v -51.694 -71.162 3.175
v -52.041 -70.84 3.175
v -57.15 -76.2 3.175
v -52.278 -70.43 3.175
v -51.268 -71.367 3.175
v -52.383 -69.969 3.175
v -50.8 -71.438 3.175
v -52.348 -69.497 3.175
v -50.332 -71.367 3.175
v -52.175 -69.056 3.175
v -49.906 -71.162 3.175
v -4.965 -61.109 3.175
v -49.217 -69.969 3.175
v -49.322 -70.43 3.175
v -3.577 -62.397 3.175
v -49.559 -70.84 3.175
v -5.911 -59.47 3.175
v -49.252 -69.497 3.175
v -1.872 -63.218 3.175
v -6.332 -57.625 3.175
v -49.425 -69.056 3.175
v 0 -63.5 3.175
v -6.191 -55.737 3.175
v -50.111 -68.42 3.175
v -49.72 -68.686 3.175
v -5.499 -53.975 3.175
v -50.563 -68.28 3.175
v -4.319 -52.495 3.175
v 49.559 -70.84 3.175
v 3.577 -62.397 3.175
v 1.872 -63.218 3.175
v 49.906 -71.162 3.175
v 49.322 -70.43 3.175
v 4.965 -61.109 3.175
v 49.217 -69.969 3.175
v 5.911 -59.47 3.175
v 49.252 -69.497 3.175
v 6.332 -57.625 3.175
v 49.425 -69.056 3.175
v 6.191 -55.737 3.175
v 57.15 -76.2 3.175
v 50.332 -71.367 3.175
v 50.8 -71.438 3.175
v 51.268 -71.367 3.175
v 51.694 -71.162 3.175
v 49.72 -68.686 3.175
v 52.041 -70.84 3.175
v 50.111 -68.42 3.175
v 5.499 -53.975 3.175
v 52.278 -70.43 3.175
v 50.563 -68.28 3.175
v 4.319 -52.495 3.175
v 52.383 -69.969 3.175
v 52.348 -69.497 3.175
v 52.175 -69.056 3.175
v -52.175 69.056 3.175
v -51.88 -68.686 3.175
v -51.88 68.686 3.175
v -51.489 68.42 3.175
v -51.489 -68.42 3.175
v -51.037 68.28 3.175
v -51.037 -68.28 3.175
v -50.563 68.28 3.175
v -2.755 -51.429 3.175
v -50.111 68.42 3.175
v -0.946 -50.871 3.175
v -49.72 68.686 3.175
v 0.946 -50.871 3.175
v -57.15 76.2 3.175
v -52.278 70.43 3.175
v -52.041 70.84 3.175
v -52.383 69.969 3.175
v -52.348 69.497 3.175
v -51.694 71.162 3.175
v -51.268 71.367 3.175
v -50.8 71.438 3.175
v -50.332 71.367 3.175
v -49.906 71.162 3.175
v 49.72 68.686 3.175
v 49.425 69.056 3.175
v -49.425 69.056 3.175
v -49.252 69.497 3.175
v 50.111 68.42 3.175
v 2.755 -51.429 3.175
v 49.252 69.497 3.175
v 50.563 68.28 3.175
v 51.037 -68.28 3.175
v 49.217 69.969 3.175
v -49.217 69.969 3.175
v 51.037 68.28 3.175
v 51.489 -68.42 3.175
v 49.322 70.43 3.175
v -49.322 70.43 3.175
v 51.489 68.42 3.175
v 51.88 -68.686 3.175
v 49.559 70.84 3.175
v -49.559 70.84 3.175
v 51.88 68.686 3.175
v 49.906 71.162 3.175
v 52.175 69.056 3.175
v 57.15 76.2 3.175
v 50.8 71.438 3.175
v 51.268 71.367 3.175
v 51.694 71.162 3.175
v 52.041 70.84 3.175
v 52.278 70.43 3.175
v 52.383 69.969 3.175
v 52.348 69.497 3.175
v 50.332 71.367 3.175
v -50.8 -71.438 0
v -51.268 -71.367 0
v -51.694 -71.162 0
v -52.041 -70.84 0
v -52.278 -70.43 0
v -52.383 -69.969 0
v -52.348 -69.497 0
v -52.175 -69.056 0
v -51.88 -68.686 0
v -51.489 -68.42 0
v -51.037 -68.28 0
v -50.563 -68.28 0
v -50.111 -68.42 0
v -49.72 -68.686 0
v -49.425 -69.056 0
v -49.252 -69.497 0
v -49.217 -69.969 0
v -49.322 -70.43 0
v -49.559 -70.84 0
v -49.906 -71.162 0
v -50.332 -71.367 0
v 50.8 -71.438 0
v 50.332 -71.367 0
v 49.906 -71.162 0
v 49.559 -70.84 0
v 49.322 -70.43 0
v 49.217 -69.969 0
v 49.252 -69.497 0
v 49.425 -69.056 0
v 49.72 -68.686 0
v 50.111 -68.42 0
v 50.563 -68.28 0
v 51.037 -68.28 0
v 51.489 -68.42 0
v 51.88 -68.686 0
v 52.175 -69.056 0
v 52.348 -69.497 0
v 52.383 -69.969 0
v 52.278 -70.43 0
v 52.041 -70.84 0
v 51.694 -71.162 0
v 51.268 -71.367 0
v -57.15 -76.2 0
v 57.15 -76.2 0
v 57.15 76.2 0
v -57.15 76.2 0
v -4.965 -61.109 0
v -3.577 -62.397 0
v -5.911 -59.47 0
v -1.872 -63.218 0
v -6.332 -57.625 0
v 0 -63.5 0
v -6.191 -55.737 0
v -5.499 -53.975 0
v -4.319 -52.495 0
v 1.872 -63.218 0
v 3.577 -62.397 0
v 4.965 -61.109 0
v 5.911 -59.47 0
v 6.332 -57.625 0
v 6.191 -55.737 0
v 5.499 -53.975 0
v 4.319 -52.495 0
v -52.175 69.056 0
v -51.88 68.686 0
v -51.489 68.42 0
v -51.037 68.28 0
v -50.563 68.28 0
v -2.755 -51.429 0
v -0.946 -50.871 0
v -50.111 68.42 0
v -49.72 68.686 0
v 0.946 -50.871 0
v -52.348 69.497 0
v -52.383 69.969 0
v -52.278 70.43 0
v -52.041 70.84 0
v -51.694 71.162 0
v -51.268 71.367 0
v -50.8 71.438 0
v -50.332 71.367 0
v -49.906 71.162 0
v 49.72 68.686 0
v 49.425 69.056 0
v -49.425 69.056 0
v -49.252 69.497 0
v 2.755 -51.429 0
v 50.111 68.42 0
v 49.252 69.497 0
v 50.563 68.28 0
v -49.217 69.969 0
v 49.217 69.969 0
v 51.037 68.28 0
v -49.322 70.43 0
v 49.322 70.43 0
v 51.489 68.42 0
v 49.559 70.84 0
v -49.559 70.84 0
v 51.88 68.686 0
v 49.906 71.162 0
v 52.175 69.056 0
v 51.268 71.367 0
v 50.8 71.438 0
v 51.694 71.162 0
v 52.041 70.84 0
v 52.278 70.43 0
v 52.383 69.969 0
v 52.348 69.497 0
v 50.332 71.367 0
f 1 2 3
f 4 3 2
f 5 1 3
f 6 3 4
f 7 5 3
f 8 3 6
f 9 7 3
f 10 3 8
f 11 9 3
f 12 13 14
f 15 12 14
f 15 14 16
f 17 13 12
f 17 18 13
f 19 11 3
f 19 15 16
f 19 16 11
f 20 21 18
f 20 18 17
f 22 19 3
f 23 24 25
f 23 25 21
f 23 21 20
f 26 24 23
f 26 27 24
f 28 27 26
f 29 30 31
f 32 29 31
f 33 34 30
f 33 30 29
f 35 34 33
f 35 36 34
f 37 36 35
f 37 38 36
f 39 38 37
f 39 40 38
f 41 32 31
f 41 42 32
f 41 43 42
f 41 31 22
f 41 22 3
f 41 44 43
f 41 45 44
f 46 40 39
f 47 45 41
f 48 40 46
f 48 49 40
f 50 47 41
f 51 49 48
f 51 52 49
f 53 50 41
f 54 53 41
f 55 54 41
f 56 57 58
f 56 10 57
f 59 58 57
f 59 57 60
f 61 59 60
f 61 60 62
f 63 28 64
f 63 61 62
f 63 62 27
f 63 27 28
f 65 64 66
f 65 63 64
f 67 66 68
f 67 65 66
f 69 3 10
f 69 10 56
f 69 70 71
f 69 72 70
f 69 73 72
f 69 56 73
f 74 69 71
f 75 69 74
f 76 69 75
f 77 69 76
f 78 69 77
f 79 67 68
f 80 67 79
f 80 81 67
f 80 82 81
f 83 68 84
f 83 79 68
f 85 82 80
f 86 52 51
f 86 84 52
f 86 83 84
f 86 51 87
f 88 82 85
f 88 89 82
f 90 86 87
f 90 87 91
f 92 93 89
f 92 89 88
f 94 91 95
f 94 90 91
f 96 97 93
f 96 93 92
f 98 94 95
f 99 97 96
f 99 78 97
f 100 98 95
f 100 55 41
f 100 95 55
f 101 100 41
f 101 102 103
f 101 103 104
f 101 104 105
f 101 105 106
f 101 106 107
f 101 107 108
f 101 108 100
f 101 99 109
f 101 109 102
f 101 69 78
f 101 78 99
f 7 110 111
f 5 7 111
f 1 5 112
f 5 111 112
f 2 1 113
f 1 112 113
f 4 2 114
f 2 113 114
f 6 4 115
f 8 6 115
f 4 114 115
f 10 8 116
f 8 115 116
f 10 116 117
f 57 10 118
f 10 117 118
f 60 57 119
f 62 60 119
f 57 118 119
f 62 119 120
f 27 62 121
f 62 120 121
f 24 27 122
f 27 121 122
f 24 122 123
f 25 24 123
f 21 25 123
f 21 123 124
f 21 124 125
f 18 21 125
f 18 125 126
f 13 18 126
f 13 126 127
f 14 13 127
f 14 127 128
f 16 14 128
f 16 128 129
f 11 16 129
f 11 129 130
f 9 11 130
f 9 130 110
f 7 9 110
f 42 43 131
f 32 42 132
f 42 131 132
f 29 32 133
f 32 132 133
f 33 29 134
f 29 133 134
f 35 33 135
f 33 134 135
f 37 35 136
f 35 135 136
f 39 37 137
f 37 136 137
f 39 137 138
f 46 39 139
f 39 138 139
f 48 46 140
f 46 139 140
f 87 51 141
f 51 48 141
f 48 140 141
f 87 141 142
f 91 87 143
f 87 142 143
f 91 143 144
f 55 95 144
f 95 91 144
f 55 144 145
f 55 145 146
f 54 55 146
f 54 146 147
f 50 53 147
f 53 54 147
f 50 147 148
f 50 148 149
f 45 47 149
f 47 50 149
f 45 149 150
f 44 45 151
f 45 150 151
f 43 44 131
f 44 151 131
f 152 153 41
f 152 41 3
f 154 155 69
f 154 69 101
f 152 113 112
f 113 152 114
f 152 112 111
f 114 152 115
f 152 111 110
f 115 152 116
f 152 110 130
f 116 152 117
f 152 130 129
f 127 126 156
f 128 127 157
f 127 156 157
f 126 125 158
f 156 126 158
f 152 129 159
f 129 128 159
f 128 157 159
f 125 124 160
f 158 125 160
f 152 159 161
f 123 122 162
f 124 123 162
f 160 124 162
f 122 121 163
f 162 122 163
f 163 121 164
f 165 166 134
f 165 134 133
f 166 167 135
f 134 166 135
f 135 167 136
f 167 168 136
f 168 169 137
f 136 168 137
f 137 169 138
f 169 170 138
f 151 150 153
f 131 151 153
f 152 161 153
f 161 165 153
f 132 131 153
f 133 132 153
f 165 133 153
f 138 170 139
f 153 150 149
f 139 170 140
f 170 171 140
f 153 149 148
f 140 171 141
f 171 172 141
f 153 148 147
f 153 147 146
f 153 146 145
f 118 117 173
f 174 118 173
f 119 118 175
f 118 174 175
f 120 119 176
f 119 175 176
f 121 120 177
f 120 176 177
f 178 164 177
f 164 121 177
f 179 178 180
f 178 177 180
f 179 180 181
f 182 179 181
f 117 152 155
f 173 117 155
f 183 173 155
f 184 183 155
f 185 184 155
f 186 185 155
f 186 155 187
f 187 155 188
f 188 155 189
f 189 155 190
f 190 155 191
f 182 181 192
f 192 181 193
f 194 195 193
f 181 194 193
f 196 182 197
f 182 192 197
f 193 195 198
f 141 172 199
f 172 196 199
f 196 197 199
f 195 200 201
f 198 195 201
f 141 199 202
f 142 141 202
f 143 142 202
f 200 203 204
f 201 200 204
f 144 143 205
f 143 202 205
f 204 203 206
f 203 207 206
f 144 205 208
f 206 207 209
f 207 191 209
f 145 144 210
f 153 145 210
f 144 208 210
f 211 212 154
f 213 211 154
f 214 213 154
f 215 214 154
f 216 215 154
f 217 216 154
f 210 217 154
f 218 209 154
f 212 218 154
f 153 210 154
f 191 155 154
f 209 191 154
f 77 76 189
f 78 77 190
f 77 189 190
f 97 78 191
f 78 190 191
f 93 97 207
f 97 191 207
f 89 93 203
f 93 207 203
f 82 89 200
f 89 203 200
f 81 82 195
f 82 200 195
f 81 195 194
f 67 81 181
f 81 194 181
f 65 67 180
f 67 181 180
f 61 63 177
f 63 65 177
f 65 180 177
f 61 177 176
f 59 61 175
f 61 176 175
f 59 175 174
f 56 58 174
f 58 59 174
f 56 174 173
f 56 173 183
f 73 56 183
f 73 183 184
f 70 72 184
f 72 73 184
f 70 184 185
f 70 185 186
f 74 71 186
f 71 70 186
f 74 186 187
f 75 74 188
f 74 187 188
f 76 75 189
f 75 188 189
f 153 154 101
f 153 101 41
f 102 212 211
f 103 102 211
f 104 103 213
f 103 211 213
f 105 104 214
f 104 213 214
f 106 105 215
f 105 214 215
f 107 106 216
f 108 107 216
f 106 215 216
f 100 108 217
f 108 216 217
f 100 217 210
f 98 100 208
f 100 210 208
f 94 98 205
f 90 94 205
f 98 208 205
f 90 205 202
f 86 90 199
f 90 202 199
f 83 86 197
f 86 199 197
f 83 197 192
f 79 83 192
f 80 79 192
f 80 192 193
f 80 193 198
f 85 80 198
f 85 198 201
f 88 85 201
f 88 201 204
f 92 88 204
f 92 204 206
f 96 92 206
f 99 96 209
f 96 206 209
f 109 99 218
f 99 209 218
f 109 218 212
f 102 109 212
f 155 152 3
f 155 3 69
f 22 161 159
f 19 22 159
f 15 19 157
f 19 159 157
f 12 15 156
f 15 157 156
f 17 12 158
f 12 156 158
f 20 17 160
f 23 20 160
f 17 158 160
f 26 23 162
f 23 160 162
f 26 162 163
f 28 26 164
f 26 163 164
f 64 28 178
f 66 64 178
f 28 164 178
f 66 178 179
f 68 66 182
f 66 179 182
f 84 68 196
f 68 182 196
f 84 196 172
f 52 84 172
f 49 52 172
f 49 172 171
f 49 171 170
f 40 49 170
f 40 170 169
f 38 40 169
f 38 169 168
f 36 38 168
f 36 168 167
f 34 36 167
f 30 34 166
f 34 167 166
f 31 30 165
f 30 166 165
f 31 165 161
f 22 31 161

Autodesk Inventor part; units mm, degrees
ref_plane "YZ Plane" through (0, 0, 0) normal (1, 0, 0) x (0, 1, 0)
ref_plane "XZ Plane" through (0, 0, 0) normal (0, 1, 0) x (-1, 0, 0)
ref_plane "XY Plane" through (0, 0, 0) normal (0, 0, 1) x (1, 0, 0)
sketch "Sketch1" plane through (0, 0, 0) normal (0, 0, 1) x (1, 0, 0)
  line L0 (0, 0) -> (0, 40.5449) construction
  line L1 (0, 0) -> (42.3786, 0) construction
  line L2 (-57.15, 76.2) -> (57.15, 76.2)
  line L3 (57.15, 76.2) -> (57.15, -76.2)
  line L4 (57.15, -76.2) -> (-57.15, -76.2)
  line L5 (-57.15, -76.2) -> (-57.15, 76.2)
  dimension "d0" = 152.4
  dimension "d1" = 114.3
extrude "Extrusion1" add sketch "Sketch1" along normal blind 3.175
sketch "Sketch2" plane through (0, 0, 3.175) normal (0, 0, 1) x (1, 0, 0)
  line L0 (-57.15, 76.2) -> (-57.15, -76.2) projected
  line L1 (-57.15, -76.2) -> (57.15, -76.2) projected
  point P0 (0, 0)
  point P1 (0, -57.15)
  dimension "d5" = 57.15
  dimension "d22" = 19.05
hole "Hole1" at (0, -57.15, 3.175) direction (0, 0, -1) diameter 12.7 end through all
sketch "Sketch3" plane through (0, 0, 3.175) normal (0, 0, 1) x (1, 0, 0)
  line L0 (-57.15, -76.2) -> (57.15, -76.2) projected
  line L1 (-57.15, 76.2) -> (-57.15, -76.2) projected
  point P0 (0, 0)
  point P1 (-50.8, -69.85)
  dimension "d13" = 6.35
  dimension "d14" = 6.35
hole "Hole2" at (-50.8, -69.85, 3.175) direction (0, 0, -1) diameter 3.175 end through all
mirror "Mirror1" about plane through (0, 0, 0) normal (1, 0, 0) of "Hole2"
mirror "Mirror2" about plane through (0, 0, 0) normal (0, 1, 0) of "Hole2", "Mirror1"
properties part number "GearBoxFrontPlate"
